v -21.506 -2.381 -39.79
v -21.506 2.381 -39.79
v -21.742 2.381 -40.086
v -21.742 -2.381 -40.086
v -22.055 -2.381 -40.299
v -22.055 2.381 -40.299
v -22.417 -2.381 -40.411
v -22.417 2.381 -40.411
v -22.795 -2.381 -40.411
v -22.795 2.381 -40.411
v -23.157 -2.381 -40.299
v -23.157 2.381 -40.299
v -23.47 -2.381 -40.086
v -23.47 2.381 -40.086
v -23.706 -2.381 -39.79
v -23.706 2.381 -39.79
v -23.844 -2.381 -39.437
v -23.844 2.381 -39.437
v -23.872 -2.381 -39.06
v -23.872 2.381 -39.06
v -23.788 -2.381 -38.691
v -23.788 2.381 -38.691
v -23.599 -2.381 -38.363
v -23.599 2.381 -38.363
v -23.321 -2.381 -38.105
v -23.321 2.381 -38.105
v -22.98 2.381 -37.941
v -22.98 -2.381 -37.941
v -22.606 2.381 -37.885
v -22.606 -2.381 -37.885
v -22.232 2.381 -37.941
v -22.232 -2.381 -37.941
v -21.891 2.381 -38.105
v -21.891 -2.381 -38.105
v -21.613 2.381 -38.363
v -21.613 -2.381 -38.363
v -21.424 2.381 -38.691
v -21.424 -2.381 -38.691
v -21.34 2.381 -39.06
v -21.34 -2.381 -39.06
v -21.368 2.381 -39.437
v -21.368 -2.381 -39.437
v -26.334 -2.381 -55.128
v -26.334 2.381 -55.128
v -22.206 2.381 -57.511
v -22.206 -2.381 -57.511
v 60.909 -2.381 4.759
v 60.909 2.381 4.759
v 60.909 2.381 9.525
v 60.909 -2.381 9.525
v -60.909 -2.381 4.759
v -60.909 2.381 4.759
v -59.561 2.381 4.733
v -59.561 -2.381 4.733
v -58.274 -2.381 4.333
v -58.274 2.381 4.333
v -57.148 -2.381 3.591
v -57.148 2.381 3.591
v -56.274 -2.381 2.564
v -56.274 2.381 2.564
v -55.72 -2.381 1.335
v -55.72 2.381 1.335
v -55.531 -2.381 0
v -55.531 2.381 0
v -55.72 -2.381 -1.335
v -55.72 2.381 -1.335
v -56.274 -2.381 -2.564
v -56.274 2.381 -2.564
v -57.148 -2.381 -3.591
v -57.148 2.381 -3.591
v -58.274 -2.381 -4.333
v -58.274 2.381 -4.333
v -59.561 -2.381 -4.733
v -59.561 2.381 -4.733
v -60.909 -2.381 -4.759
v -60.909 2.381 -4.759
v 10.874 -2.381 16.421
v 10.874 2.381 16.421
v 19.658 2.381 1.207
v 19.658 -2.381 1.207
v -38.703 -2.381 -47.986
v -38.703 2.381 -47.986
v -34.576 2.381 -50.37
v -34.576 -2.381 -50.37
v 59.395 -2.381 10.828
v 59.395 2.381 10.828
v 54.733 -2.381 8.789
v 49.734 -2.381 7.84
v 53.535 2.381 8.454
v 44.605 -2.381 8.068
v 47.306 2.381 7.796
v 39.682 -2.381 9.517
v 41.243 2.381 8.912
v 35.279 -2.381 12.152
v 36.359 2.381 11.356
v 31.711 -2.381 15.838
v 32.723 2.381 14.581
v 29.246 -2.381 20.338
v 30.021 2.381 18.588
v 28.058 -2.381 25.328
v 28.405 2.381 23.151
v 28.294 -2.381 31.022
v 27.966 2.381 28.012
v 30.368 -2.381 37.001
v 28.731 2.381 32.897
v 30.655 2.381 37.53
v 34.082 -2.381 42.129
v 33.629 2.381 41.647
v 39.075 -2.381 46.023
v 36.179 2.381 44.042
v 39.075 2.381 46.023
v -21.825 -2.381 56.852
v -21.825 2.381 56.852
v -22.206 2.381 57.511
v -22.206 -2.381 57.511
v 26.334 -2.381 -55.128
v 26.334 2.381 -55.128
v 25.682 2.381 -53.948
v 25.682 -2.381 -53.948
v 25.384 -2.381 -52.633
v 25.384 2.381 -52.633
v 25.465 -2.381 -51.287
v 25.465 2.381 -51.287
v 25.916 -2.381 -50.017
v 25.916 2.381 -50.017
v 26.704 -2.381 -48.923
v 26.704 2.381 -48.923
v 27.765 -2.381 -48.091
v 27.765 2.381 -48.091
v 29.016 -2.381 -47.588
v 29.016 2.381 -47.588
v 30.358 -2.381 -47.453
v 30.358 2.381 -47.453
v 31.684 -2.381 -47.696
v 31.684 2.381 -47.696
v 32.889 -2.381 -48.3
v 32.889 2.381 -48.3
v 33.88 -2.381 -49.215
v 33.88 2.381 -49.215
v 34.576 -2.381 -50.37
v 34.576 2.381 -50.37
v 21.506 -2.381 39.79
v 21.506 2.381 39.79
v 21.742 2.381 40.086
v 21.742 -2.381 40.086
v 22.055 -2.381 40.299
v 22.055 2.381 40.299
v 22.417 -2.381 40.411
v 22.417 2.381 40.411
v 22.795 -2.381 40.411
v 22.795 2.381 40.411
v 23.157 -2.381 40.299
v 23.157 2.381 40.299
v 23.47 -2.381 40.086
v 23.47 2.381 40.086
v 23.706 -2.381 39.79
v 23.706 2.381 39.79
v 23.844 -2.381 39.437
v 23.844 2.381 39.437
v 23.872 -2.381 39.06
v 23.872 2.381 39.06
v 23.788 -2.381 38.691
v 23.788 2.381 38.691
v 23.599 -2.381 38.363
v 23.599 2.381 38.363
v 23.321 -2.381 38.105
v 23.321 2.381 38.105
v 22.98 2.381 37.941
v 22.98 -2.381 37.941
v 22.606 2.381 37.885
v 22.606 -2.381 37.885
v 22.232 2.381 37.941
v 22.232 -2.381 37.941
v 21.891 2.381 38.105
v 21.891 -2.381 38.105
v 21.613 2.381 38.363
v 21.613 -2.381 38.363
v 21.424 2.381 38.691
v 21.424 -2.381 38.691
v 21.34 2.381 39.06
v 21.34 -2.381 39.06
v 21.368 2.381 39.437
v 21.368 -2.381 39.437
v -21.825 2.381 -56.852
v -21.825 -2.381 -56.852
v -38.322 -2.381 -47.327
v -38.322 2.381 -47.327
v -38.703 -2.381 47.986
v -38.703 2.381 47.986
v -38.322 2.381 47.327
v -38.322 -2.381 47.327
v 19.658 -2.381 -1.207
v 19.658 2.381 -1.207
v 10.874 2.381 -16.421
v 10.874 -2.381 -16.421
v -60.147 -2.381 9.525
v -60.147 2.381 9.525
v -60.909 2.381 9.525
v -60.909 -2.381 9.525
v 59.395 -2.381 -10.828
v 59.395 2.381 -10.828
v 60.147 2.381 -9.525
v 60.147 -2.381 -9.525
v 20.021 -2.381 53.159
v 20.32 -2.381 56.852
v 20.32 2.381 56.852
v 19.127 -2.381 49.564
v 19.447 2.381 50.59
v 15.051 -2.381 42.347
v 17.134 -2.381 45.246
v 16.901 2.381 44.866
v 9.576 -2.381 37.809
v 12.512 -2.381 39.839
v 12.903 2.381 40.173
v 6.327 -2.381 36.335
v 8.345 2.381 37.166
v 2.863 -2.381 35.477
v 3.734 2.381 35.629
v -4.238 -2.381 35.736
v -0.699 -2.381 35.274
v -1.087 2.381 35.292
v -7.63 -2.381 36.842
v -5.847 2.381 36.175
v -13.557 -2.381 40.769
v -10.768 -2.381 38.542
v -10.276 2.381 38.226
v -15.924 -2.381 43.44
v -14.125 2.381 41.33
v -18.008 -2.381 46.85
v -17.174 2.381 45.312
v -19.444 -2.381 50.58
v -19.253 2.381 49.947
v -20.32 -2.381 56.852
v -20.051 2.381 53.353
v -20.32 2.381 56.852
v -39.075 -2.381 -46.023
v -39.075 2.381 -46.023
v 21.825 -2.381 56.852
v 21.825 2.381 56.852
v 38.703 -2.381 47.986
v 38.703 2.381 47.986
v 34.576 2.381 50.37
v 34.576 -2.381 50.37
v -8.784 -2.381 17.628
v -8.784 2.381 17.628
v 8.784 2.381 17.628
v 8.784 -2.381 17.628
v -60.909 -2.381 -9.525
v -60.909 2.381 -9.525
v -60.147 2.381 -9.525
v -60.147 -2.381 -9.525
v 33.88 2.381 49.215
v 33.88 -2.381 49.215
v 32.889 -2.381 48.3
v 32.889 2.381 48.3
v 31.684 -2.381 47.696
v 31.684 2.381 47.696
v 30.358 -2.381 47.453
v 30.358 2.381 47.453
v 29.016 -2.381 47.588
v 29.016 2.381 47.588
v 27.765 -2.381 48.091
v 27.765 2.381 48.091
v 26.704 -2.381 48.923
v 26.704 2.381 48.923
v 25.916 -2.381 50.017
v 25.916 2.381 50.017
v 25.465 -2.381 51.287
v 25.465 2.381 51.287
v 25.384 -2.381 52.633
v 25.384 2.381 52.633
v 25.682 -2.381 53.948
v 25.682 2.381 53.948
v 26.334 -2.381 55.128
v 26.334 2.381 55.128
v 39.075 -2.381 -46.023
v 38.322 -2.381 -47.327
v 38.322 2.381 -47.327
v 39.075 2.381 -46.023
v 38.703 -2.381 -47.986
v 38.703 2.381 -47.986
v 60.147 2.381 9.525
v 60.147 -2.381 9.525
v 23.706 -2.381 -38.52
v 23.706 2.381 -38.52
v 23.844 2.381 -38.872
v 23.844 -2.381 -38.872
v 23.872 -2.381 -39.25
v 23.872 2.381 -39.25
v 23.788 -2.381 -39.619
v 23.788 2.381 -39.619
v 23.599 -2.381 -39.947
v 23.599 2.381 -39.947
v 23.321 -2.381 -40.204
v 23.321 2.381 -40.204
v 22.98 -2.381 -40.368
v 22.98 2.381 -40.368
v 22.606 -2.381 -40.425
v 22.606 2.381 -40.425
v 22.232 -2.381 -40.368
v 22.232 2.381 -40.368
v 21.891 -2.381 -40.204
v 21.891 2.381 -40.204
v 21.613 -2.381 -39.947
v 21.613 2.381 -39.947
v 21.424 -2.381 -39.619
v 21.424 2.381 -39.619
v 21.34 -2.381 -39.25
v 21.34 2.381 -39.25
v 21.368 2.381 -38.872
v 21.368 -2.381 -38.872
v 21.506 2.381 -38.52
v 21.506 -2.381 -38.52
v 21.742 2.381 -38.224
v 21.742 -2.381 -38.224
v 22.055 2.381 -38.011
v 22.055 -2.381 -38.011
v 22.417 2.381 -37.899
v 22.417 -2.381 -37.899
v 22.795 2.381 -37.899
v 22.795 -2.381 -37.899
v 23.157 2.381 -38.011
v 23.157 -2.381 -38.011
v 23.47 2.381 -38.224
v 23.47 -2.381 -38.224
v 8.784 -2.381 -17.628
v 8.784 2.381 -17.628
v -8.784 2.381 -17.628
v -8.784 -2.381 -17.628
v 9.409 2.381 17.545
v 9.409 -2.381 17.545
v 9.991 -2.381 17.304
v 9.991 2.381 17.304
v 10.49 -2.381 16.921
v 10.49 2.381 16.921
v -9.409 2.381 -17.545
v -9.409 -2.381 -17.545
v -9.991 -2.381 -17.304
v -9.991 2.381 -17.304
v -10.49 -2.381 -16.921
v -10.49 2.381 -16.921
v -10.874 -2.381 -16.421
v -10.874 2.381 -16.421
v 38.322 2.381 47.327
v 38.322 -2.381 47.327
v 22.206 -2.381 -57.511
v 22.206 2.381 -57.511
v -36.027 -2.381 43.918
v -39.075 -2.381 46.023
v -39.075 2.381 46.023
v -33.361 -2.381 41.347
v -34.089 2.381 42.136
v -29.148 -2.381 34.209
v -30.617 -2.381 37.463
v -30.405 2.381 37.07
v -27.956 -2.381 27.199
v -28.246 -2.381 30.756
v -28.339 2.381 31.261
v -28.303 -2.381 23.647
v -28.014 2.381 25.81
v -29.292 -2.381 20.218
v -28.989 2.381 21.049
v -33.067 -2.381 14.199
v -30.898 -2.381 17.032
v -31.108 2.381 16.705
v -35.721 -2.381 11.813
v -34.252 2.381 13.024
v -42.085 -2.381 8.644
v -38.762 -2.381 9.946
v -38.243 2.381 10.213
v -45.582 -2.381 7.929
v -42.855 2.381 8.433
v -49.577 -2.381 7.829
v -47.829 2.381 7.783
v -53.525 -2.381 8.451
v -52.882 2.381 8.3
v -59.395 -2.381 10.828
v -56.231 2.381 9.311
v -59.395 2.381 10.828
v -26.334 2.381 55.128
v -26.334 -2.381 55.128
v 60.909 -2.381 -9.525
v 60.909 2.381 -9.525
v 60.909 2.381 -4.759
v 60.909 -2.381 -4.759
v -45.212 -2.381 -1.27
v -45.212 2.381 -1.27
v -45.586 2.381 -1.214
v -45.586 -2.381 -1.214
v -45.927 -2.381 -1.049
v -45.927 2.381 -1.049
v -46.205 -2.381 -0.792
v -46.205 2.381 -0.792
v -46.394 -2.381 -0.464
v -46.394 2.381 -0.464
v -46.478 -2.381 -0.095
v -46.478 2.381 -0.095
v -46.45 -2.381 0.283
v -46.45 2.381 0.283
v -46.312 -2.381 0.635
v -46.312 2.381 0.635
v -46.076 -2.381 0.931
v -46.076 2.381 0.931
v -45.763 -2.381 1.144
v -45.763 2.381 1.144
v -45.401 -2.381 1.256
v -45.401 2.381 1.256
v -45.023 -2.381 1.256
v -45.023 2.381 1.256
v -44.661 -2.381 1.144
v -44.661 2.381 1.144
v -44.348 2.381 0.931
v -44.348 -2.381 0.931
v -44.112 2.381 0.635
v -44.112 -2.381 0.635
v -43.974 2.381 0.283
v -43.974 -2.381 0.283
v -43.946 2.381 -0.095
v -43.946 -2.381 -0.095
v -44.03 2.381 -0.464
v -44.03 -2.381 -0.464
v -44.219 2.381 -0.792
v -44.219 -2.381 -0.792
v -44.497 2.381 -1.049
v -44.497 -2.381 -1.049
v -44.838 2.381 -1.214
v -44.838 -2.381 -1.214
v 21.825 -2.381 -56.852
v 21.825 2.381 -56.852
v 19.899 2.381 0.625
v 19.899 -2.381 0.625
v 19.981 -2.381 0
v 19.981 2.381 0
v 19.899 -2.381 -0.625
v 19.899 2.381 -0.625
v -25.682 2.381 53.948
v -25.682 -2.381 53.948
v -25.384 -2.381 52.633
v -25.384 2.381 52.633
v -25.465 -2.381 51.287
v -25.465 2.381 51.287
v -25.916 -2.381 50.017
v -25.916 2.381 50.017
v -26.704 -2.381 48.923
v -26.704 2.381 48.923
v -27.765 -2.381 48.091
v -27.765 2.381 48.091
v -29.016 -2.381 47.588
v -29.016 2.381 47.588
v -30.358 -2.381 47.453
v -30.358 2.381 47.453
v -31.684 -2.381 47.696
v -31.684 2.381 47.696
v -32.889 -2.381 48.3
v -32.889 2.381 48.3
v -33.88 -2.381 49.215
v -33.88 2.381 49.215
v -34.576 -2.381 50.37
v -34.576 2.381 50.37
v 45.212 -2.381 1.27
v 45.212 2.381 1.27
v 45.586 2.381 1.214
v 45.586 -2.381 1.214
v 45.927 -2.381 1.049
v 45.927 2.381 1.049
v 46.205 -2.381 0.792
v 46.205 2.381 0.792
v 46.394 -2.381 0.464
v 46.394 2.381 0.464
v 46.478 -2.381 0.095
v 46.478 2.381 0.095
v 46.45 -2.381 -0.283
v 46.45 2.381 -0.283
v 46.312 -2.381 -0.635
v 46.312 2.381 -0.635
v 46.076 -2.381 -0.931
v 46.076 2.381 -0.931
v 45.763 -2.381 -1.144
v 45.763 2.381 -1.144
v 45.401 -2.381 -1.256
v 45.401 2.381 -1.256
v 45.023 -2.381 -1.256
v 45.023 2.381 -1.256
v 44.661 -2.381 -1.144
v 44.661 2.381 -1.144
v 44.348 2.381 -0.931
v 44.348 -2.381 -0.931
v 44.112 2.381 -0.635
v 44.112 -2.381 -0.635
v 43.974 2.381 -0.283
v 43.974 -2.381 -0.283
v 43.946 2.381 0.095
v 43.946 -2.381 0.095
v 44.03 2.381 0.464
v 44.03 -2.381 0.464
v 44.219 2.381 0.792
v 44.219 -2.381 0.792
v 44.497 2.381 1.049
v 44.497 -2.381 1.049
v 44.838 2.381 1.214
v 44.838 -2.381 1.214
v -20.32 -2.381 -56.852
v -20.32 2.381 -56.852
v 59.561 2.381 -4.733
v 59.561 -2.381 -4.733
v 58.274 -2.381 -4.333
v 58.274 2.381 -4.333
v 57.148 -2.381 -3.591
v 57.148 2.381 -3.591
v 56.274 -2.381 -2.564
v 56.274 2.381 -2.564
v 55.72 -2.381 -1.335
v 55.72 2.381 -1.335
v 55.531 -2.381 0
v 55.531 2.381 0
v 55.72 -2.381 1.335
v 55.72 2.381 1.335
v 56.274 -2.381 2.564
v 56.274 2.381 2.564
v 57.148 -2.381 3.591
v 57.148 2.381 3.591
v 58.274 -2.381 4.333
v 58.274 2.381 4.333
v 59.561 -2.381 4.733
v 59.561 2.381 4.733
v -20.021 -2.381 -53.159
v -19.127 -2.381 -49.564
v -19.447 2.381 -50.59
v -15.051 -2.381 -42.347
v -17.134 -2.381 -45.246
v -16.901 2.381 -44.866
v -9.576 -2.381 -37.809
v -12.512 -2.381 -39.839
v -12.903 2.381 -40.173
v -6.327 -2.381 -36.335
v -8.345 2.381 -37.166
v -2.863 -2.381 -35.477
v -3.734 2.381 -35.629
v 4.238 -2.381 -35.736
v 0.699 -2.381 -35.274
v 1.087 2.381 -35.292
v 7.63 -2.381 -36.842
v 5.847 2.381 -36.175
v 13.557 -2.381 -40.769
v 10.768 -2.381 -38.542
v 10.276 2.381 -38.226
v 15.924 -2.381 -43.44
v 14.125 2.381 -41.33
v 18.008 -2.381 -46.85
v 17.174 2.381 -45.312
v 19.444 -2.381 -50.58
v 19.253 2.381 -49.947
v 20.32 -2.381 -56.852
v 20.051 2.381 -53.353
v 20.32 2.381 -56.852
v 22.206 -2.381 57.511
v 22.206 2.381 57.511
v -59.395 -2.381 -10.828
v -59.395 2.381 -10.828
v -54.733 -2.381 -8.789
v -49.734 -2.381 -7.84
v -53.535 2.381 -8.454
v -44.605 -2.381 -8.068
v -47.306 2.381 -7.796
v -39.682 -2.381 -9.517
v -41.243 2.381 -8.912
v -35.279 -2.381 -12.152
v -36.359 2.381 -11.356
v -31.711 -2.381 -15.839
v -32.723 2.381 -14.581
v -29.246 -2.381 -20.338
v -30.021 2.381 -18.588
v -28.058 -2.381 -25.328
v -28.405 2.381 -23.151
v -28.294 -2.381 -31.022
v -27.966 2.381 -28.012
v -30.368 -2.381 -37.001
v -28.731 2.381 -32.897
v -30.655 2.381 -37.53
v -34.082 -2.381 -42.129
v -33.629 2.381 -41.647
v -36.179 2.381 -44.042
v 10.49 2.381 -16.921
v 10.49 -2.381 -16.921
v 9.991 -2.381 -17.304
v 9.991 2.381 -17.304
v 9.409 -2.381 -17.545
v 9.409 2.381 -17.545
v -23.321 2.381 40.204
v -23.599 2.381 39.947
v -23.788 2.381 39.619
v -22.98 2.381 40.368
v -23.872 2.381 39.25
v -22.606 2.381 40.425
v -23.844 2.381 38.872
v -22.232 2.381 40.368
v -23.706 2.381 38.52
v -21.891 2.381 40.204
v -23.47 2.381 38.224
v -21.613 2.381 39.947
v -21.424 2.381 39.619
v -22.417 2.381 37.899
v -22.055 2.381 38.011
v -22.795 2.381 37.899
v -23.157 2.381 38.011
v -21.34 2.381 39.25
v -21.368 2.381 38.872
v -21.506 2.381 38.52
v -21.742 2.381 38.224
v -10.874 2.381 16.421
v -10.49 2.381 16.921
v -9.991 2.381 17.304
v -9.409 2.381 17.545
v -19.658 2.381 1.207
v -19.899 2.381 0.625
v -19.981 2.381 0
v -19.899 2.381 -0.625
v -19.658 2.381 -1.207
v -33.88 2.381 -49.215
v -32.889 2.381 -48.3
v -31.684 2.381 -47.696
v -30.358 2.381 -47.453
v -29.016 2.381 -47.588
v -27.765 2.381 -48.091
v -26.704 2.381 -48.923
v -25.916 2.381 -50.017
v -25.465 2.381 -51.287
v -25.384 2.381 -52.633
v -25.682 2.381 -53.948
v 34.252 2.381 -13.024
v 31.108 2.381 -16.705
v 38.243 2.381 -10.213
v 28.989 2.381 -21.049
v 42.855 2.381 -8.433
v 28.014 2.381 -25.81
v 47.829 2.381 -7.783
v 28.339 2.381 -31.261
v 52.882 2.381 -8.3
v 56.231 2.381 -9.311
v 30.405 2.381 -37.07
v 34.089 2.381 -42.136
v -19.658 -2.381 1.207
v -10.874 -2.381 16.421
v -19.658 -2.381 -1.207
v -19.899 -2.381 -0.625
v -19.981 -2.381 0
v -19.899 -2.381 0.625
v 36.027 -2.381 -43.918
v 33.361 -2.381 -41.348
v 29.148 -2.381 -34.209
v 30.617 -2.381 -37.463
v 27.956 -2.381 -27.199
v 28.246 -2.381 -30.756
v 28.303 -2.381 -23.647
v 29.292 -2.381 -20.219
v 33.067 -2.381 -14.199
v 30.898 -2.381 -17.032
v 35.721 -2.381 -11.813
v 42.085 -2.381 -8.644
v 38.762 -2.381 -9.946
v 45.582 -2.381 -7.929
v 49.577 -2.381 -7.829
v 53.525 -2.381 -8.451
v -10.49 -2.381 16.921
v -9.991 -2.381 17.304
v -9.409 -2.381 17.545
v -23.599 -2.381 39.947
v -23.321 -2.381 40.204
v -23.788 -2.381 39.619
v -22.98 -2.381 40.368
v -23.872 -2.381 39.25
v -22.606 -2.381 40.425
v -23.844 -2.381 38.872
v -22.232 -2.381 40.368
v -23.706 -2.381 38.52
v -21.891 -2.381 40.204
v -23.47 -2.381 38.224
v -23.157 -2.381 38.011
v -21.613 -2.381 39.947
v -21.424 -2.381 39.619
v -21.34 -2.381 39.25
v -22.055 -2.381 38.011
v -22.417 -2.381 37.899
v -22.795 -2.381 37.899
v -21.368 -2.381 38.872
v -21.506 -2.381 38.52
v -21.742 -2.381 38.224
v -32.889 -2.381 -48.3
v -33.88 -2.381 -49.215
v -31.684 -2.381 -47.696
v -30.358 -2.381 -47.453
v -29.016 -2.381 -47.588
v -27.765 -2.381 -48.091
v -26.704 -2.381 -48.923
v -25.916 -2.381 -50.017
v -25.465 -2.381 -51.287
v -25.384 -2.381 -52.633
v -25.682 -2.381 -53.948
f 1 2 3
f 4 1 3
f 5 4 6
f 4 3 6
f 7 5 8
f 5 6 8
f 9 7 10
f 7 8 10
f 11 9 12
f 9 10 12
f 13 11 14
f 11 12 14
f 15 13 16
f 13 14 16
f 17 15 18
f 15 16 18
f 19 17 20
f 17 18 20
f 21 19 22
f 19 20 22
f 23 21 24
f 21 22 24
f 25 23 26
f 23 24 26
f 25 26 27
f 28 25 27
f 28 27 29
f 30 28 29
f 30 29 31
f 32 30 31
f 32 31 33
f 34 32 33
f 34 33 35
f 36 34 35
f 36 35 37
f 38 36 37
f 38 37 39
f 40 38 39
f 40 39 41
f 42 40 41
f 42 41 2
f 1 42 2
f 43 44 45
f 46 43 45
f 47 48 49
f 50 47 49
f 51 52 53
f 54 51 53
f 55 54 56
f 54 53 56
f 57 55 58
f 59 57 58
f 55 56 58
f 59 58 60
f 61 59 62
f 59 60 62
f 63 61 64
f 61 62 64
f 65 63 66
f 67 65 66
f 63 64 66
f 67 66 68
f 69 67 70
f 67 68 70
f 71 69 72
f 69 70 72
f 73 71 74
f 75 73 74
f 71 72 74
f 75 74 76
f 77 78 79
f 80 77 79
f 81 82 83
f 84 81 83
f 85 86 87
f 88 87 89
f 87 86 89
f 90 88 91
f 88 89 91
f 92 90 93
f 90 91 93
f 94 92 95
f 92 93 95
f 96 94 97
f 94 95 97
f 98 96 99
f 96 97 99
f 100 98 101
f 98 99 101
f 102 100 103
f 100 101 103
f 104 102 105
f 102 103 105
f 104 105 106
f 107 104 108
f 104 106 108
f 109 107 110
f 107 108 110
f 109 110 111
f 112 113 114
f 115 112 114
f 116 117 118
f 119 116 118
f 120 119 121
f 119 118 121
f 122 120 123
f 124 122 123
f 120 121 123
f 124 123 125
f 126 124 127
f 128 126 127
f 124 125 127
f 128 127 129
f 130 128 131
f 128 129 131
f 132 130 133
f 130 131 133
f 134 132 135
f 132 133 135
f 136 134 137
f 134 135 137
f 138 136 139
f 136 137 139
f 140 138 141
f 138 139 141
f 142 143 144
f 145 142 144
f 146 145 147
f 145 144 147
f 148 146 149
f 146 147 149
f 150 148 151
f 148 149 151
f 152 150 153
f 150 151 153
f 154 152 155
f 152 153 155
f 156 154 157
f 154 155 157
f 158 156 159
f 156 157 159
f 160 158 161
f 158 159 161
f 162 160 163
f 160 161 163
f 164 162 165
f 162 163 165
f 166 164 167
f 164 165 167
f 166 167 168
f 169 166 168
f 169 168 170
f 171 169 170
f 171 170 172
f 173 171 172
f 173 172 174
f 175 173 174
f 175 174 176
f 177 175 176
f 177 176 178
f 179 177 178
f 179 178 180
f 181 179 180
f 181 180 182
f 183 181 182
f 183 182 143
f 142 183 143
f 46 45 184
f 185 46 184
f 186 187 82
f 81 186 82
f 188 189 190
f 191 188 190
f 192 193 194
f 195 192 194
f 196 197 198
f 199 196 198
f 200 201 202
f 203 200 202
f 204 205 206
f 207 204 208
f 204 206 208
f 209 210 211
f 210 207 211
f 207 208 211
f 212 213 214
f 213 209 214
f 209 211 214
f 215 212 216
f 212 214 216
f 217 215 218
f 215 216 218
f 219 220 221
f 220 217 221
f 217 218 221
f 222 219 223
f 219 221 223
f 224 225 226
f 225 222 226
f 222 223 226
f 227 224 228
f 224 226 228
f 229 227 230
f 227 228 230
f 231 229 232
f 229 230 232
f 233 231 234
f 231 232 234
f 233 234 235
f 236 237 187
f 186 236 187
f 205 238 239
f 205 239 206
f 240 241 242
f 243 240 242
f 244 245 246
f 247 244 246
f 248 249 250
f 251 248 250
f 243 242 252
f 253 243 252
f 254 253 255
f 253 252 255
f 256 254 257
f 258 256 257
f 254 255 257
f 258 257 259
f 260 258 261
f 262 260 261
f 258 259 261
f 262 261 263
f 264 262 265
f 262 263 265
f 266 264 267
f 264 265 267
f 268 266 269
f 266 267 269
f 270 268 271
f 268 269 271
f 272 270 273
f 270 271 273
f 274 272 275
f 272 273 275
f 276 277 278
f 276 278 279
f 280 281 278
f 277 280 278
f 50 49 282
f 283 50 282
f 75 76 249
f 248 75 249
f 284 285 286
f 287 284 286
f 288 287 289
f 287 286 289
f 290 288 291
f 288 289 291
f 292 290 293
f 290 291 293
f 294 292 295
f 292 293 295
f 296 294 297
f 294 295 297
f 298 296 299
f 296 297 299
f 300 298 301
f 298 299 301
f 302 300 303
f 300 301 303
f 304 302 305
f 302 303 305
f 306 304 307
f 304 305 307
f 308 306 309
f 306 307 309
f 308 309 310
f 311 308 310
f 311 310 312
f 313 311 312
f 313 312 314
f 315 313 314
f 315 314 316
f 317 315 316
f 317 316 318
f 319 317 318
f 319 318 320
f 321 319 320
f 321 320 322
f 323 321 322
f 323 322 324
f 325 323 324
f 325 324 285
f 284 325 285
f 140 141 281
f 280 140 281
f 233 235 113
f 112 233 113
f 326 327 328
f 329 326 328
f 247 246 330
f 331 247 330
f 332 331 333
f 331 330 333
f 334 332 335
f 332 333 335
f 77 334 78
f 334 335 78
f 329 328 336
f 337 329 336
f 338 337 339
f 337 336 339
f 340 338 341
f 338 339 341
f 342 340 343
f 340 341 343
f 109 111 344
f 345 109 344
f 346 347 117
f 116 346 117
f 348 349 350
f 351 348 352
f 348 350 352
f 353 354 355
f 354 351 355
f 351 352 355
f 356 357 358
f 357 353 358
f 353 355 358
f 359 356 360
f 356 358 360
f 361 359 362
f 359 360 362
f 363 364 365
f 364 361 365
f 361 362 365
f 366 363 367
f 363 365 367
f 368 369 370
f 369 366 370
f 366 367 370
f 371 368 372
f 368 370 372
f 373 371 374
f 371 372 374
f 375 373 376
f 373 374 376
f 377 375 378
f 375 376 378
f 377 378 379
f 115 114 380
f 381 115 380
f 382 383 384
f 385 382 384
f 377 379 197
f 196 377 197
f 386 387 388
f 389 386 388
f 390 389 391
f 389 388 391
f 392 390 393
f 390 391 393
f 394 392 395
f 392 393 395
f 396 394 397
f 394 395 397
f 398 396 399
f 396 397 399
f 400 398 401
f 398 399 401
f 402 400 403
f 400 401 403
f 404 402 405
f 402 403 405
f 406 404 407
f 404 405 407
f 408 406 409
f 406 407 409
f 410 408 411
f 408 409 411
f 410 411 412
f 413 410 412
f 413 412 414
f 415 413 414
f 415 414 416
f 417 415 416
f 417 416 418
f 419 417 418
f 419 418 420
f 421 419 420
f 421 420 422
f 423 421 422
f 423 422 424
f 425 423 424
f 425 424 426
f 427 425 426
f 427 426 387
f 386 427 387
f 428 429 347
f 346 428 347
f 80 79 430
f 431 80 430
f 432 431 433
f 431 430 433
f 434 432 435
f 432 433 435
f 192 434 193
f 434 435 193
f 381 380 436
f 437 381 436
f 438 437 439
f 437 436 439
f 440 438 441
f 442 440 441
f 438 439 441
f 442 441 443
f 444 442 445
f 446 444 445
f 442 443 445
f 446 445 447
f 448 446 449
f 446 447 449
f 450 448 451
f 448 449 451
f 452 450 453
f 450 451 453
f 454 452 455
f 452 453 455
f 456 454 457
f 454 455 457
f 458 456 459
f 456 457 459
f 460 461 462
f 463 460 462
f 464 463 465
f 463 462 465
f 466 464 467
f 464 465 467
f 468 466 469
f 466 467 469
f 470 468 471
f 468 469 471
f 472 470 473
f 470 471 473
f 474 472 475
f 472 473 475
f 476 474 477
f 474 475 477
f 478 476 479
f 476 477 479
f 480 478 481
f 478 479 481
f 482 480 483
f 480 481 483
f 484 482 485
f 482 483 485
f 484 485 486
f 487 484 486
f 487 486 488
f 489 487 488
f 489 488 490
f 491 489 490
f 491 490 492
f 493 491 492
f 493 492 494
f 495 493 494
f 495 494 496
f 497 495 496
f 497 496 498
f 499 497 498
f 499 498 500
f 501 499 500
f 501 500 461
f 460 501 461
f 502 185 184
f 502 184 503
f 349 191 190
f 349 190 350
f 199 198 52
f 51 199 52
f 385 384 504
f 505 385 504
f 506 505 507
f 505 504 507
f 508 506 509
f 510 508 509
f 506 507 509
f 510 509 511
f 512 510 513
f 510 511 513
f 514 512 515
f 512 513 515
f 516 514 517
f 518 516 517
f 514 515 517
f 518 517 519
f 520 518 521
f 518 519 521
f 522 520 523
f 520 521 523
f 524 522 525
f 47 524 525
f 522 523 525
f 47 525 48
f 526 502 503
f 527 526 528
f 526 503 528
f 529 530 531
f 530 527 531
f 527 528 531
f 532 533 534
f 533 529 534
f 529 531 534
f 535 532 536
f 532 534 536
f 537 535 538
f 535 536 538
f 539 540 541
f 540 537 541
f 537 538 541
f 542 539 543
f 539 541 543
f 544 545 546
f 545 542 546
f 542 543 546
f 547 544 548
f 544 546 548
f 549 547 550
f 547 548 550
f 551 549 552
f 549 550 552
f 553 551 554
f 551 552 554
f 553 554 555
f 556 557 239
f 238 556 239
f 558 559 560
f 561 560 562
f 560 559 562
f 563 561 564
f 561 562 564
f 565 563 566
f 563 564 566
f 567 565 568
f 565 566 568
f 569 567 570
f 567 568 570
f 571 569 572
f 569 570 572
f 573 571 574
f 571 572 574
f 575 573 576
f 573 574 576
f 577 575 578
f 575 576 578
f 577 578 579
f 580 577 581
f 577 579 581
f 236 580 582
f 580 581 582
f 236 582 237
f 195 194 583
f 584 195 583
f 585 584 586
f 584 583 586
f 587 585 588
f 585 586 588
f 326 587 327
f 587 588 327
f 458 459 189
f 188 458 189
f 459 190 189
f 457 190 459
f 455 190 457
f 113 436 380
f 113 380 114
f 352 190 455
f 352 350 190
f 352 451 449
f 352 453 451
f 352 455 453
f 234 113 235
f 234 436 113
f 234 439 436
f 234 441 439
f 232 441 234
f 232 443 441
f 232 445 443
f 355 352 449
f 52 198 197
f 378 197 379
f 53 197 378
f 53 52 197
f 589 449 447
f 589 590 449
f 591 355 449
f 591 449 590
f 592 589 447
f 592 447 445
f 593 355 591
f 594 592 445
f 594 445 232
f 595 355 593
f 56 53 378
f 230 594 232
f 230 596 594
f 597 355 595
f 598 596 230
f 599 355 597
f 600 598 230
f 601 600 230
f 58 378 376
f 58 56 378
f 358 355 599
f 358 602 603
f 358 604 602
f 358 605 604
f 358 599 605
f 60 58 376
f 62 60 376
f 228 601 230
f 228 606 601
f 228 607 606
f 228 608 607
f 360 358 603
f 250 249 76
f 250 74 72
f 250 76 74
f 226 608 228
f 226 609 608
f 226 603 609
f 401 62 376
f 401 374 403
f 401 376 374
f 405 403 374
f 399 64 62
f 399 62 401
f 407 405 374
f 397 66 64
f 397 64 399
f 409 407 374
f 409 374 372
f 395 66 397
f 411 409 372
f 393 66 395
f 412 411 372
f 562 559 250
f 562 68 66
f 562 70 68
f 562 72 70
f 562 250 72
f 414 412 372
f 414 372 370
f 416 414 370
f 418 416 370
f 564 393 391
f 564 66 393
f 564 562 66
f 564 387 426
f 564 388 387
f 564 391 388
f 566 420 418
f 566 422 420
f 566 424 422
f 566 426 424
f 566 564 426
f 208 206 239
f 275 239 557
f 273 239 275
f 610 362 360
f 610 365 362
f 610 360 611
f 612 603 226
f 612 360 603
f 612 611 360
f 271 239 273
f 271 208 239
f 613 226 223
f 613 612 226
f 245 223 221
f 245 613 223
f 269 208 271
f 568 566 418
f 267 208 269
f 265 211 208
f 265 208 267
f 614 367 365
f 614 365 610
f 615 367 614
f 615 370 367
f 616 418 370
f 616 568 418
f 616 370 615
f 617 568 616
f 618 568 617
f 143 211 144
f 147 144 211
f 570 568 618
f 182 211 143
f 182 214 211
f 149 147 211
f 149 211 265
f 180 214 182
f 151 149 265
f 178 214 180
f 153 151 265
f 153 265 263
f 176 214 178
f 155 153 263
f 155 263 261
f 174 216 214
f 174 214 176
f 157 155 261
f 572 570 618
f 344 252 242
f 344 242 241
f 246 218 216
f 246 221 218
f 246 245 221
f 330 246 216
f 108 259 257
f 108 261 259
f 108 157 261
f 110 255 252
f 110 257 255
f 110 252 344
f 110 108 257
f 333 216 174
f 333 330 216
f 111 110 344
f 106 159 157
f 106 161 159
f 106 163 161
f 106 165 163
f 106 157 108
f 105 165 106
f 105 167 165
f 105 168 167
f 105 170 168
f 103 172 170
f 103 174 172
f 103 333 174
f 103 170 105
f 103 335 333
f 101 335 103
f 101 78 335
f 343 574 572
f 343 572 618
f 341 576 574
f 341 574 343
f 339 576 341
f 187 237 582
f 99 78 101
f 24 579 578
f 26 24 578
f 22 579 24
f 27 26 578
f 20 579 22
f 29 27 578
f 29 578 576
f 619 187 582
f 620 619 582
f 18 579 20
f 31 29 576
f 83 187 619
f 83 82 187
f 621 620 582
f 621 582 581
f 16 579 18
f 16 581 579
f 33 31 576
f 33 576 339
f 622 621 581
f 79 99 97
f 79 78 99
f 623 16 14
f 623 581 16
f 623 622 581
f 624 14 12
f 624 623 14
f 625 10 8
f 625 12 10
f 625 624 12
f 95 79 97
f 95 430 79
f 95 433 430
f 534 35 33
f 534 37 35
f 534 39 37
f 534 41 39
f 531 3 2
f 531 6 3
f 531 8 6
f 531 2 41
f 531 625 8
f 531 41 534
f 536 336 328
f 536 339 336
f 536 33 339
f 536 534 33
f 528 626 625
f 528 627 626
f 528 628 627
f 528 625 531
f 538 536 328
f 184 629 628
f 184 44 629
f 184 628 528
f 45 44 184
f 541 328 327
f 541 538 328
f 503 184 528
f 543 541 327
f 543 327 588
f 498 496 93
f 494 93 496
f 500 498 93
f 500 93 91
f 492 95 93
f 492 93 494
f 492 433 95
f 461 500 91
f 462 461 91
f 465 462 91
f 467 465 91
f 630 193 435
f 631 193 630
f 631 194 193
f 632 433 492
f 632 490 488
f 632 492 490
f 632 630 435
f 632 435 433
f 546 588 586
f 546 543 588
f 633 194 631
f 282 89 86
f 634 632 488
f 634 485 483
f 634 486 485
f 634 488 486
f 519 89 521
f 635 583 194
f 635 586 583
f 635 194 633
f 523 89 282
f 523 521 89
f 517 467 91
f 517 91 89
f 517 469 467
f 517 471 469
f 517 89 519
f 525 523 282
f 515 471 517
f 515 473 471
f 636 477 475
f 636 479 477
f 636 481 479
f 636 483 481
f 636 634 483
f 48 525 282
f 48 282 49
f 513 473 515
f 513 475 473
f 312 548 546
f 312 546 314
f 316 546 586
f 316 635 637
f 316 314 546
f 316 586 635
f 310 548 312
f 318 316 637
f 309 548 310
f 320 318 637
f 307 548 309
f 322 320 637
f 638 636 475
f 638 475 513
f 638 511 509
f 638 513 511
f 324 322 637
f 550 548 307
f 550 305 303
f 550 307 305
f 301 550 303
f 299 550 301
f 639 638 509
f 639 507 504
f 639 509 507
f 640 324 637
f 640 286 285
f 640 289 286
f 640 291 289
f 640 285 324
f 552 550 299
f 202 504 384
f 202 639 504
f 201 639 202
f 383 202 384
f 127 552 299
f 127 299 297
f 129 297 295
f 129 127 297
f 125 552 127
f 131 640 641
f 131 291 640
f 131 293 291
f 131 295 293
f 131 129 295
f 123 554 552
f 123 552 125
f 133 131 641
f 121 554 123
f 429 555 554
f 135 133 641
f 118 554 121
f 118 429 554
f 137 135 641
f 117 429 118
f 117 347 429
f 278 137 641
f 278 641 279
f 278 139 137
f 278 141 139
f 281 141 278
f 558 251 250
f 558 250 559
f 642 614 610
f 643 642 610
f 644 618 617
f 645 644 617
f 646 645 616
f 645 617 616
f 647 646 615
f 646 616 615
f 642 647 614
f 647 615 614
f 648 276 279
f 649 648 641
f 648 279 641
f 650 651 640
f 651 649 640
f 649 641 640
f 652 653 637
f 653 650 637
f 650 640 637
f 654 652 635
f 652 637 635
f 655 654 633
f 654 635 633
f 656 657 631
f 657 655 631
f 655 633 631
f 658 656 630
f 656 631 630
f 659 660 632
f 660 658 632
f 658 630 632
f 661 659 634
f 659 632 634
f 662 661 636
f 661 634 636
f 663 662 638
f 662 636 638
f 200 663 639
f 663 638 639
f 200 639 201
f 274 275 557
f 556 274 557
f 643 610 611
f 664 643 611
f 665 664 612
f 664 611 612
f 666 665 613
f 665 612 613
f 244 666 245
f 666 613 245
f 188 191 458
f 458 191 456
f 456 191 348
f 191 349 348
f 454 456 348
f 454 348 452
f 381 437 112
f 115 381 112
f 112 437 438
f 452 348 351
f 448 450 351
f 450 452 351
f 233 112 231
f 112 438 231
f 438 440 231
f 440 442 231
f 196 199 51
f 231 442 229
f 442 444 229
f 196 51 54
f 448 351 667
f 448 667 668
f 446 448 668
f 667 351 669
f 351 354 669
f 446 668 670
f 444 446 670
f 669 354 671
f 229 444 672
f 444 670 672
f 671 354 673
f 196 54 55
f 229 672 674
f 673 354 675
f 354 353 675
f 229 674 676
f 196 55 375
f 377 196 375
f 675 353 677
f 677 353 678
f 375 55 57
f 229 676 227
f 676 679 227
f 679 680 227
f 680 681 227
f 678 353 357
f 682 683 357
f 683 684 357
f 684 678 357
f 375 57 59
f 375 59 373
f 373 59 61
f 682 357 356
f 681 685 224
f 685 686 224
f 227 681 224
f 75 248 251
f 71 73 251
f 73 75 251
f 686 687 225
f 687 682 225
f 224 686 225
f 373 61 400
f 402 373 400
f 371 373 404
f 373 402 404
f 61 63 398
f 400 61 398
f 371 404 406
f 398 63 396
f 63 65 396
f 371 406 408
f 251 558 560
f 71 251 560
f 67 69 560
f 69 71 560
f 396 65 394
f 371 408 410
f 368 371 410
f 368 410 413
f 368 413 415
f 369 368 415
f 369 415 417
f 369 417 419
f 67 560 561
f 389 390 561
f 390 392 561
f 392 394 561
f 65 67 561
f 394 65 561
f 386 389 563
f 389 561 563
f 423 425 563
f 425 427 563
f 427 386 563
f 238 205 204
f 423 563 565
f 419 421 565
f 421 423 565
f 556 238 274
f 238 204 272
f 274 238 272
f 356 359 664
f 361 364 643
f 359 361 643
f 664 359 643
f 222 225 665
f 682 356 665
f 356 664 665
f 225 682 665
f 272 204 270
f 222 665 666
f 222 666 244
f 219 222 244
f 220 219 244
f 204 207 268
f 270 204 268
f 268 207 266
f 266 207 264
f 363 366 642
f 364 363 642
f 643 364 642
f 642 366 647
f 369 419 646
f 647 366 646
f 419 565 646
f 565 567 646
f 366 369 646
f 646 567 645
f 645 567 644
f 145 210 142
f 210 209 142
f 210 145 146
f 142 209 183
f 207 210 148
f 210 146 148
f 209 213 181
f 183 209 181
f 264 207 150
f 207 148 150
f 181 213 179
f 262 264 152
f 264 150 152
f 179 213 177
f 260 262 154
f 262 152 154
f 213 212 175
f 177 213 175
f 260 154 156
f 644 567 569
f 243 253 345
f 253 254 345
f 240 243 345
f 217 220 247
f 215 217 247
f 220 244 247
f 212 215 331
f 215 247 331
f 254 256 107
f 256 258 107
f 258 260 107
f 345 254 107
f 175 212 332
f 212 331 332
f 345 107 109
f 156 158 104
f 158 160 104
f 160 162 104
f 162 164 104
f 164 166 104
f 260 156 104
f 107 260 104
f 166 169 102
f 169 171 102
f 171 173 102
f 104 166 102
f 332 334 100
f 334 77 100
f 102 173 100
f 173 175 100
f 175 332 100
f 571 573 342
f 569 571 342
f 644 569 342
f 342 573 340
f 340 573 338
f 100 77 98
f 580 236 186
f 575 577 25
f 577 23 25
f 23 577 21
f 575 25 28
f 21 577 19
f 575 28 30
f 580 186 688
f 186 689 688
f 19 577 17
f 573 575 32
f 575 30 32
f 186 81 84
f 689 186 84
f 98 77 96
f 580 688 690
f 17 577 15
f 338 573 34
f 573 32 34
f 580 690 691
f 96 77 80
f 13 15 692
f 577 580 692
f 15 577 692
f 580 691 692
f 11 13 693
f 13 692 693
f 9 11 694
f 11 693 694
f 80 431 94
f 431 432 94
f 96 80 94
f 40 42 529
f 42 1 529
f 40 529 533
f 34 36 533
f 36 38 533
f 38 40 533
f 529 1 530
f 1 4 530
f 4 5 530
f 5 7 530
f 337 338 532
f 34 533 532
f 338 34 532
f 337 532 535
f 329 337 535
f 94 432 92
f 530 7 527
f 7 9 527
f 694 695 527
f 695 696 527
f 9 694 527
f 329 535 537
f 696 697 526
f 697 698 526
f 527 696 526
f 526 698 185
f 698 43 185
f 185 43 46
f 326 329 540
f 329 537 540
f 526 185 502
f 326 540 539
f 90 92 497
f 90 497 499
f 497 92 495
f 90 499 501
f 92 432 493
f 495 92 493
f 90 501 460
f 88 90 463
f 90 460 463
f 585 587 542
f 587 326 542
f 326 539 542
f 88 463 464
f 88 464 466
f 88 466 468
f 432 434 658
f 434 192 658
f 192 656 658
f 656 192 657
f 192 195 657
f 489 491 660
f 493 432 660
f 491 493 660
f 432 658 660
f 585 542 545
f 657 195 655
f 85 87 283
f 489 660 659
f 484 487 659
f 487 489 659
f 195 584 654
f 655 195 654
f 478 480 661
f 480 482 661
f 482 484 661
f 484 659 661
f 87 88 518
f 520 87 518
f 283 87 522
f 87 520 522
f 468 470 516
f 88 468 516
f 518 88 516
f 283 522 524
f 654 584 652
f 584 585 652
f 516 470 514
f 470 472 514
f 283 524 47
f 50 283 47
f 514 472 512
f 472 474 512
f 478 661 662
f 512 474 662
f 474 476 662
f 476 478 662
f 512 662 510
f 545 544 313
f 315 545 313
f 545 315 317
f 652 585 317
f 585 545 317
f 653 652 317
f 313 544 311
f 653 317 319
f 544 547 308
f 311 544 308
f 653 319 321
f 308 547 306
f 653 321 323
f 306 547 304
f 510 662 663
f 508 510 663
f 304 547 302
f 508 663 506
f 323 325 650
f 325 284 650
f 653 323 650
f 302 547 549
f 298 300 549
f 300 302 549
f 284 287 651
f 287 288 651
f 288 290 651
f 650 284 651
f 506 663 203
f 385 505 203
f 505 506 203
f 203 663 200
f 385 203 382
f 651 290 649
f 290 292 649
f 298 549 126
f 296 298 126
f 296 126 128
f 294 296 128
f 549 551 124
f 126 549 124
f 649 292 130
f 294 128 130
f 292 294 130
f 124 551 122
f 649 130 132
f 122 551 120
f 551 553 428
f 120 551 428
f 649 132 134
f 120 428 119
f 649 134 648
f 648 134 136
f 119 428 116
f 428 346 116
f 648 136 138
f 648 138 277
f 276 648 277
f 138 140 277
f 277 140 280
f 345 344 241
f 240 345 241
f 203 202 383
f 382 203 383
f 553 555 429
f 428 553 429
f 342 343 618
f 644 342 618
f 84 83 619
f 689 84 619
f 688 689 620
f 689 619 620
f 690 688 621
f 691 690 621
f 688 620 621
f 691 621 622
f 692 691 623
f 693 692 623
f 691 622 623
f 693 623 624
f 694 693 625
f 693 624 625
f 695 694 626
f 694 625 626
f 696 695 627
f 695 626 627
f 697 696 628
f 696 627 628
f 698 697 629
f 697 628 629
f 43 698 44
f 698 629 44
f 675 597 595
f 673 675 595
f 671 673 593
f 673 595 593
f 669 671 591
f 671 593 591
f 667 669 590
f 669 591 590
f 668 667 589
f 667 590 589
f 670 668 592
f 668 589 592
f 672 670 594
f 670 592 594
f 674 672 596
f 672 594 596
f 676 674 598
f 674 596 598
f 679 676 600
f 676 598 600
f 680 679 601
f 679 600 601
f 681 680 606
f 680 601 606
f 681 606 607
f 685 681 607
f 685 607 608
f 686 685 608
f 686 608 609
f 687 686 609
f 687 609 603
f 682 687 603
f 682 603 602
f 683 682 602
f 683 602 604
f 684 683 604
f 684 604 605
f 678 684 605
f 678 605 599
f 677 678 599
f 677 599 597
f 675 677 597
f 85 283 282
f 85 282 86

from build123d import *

# Parameters (mm, degrees)
SKETCH1_R           = 12.7
BOSS_EXTRUDE1_DEPTH = 2.38125
CUT_EXTRUDE1_DEPTH  = 83.900304501
FILLET1_R           = 3.175
SKETCH3_RX          = 21.59
SKETCH3_RY          = 20.32
CUT_EXTRUDE2_DEPTH  = 83.900304501
CIRPATTERN1_COUNT   = 6
SKETCH4_R           = 1.27
CUT_EXTRUDE3_DEPTH  = 83.900304648
CIRPATTERN2_COUNT   = 6
BOSS_EXTRUDE2_DEPTH = 4.7625


with BuildPart() as part:
    # Sketch1 → Boss-Extrude1 (new, symmetric)
    with BuildSketch(Plane(origin=(0, 0, 0), x_dir=(1, 0, 0), z_dir=(0, 1, 0))):
        with BuildLine():
            Line((-60.1472, 5.553404471), (-60.1472, 9.525))
            Line((-60.1472, 9.525), (-38.322491971, 47.326503167))
            Line((-38.322491971, 47.326503167), (-34.88298935, 49.312300931))
            ThreePointArc((-34.88298935, 49.312300931), (-27.384375, 47.431128834), (-25.26421065, 54.865705402))
            Line((-25.26421065, 54.865705402), (-21.824708029, 56.851503167))
            Line((-21.824708029, 56.851503167), (21.824708029, 56.851503167))
            Line((21.824708029, 56.851503167), (25.26421065, 54.865705402))
            ThreePointArc((25.26421065, 54.865705402), (27.384375, 47.431128834), (34.88298935, 49.312300931))
            Line((34.88298935, 49.312300931), (38.322491971, 47.326503167))
            Line((38.322491971, 47.326503167), (60.1472, 9.525))
            Line((60.1472, 9.525), (60.1472, 5.553404471))
            ThreePointArc((60.1472, 5.553404471), (54.76875, 0), (60.1472, -5.553404471))
            Line((60.1472, -5.553404471), (60.1472, -9.525))
            Line((60.1472, -9.525), (38.322491971, -47.326503167))
            Line((38.322491971, -47.326503167), (34.88298935, -49.312300931))
            ThreePointArc((34.88298935, -49.312300931), (27.384375, -47.431128834), (25.26421065, -54.865705402))
            Line((25.26421065, -54.865705402), (21.824708029, -56.851503167))
            Line((21.824708029, -56.851503167), (-21.824708029, -56.851503167))
            Line((-21.824708029, -56.851503167), (-25.26421065, -54.865705402))
            ThreePointArc((-25.26421065, -54.865705402), (-27.384375, -47.431128834), (-34.88298935, -49.312300931))
            Line((-34.88298935, -49.312300931), (-38.322491971, -47.326503167))
            Line((-38.322491971, -47.326503167), (-60.1472, -9.525))
            Line((-60.1472, -9.525), (-60.1472, -5.553404471))
            ThreePointArc((-60.1472, -5.553404471), (-54.76875, 0), (-60.1472, 5.553404471))
        make_face()
        with Locations(Location((0, 0, 0), (0, 0, 90))):
            Circle(SKETCH1_R, mode=Mode.SUBTRACT)
    extrude(amount=BOSS_EXTRUDE1_DEPTH, both=True)

    # Sketch2 → Cut-Extrude1 (cut, through all)
    with BuildSketch(Plane(origin=(0, 2.38125, 0), x_dir=(1, 0, 0), z_dir=(0, 1, 0))):
        Polygon((10.61724051, -18.3896), (21.234481021, 0), (10.61724051, 18.3896), (-10.61724051, 18.3896), (-21.234481021, 0), (-10.61724051, -18.3896), align=None)
    extrude(amount=-CUT_EXTRUDE1_DEPTH, mode=Mode.SUBTRACT)

    # Fillet1
    fillet1_edges = [part.edges().sort_by_distance(p)[0] for p in [
        (10.61724051, 0, 18.3896),
        (-10.61724051, 0, 18.3896),
        (-21.234481021, 0, 0),
        (-10.61724051, 0, -18.3896),
        (10.61724051, 0, -18.3896),
        (21.234481021, 0, 0),
    ]]
    fillet(fillet1_edges, radius=FILLET1_R)

    # Sketch3 → Cut-Extrude2 (cut, through all)
    with BuildSketch(Plane(origin=(0, 2.38125, 0), x_dir=(1, 0, 0), z_dir=(0, 1, 0))):
        with Locations(Location((0, -56.851503167), (0, 0, -90))):
            Ellipse(SKETCH3_RX, SKETCH3_RY)
    cut_extrude2 = extrude(amount=-CUT_EXTRUDE2_DEPTH, mode=Mode.SUBTRACT)

    # CirPattern1: Cut-Extrude2 ×6 about axis
    cirpattern1_axis = Axis((0, -55, 0), (0, 1, 0))
    for i in range(1, CIRPATTERN1_COUNT):
        add(cut_extrude2.rotate(cirpattern1_axis, i * 360 / CIRPATTERN1_COUNT), mode=Mode.SUBTRACT)

    # Sketch4 → Cut-Extrude3 (cut, through all)
    with BuildSketch(Plane(origin=(0, 2.38125, 0), x_dir=(1, 0, 0), z_dir=(0, 1, 0))):
        with Locations(Location((45.212, 0, 0), (0, 0, 270))):
            Circle(SKETCH4_R)
    cut_extrude3 = extrude(amount=-CUT_EXTRUDE3_DEPTH, mode=Mode.SUBTRACT)

    # CirPattern2: Cut-Extrude3 ×6 about axis
    cirpattern2_axis = Axis((0, 0, 0), (0, 1, 0))
    for i in range(1, CIRPATTERN2_COUNT):
        add(cut_extrude3.rotate(cirpattern2_axis, i * 360 / CIRPATTERN2_COUNT), mode=Mode.SUBTRACT)

    # Sketch6 → Boss-Extrude2 (add)
    # profile 1 of 7: a face of its own
    with BuildSketch(Plane(origin=(0, 2.38125, 0), x_dir=(1, 0, 0), z_dir=(0, 1, 0))):
        with BuildLine():
            Line((11.533784063, -16.8021), (20.317937468, -1.5875))
            ThreePointArc((20.317937468, -1.5875), (20.743306811, 0), (20.317937468, 1.5875))
            Line((20.317937468, 1.5875), (11.533784063, 16.8021))
            ThreePointArc((11.533784063, 16.8021), (10.371653406, 17.964230657), (8.784153406, 18.3896))
            Line((8.784153406, 18.3896), (-8.784153406, 18.3896))
            ThreePointArc((-8.784153406, 18.3896), (-10.371653406, 17.964230657), (-11.533784063, 16.8021))
            Line((-11.533784063, 16.8021), (-20.317937468, 1.5875))
            ThreePointArc((-20.317937468, 1.5875), (-20.743306811, 0), (-20.317937468, -1.5875))
            Line((-20.317937468, -1.5875), (-11.533784063, -16.8021))
            ThreePointArc((-11.533784063, -16.8021), (-10.371653406, -17.964230657), (-8.784153406, -18.3896))
            Line((-8.784153406, -18.3896), (8.784153406, -18.3896))
            ThreePointArc((8.784153406, -18.3896), (10.371653406, -17.964230657), (11.533784063, -16.8021))
        make_face()
        with BuildLine():
            Line((19.658026111, 1.2065), (10.873872705, 16.4211))
            ThreePointArc((10.873872705, 16.4211), (9.990653406, 17.304319299), (8.784153406, 17.6276))
            Line((8.784153406, 17.6276), (-8.784153406, 17.6276))
            ThreePointArc((-8.784153406, 17.6276), (-9.990653406, 17.304319299), (-10.873872705, 16.4211))
            Line((-10.873872705, 16.4211), (-19.658026111, 1.2065))
            ThreePointArc((-19.658026111, 1.2065), (-19.981306811, 0), (-19.658026111, -1.2065))
            Line((-19.658026111, -1.2065), (-10.873872705, -16.4211))
            ThreePointArc((-10.873872705, -16.4211), (-9.990653406, -17.304319299), (-8.784153406, -17.6276))
            Line((-8.784153406, -17.6276), (8.784153406, -17.6276))
            ThreePointArc((8.784153406, -17.6276), (9.990653406, -17.304319299), (10.873872705, -16.4211))
            Line((10.873872705, -16.4211), (19.658026111, -1.2065))
            ThreePointArc((19.658026111, -1.2065), (19.981306811, 0), (19.658026111, 1.2065))
        make_face(mode=Mode.SUBTRACT)
    # profile 2 of 7: a face of its own
    with BuildSketch(Plane(origin=(0, 2.38125, 0), x_dir=(1, 0, 0), z_dir=(0, 1, 0))):
        with BuildLine():
            Line((-60.1472, -5.553404471), (-60.1472, -9.525))
            Line((-60.1472, -9.525), (-60.9092, -9.525))
            Line((-60.9092, -9.525), (-60.9092, -4.75852324))
            ThreePointArc((-60.9092, -4.75852324), (-55.53075, 0), (-60.9092, 4.75852324))
            Line((-60.9092, 4.75852324), (-60.9092, 9.525))
            Line((-60.9092, 9.525), (-60.1472, 9.525))
            Line((-60.1472, 9.525), (-60.1472, 5.553404471))
            ThreePointArc((-60.1472, 5.553404471), (-54.76875, 0), (-60.1472, -5.553404471))
        make_face()
    # profile 3 of 7: a face of its own
    with BuildSketch(Plane(origin=(0, 2.38125, 0), x_dir=(1, 0, 0), z_dir=(0, 1, 0))):
        with BuildLine():
            Line((-34.88298935, 49.312300931), (-38.322491971, 47.326503167))
            Line((-38.322491971, 47.326503167), (-38.703491971, 47.986414524))
            Line((-38.703491971, 47.986414524), (-34.57560201, 50.369652904))
            ThreePointArc((-34.57560201, 50.369652904), (-27.765375, 48.091040191), (-26.33359799, 55.128176144))
            Line((-26.33359799, 55.128176144), (-22.205708029, 57.511414524))
            Line((-22.205708029, 57.511414524), (-21.824708029, 56.851503167))
            Line((-21.824708029, 56.851503167), (-25.26421065, 54.865705402))
            ThreePointArc((-25.26421065, 54.865705402), (-27.384375, 47.431128834), (-34.88298935, 49.312300931))
        make_face()
    # profile 4 of 7: a face of its own
    with BuildSketch(Plane(origin=(0, 2.38125, 0), x_dir=(1, 0, 0), z_dir=(0, 1, 0))):
        with BuildLine():
            Line((25.26421065, 54.865705402), (21.824708029, 56.851503167))
            Line((21.824708029, 56.851503167), (22.205708029, 57.511414524))
            Line((22.205708029, 57.511414524), (26.33359799, 55.128176144))
            ThreePointArc((26.33359799, 55.128176144), (27.765375, 48.091040191), (34.57560201, 50.369652904))
            Line((34.57560201, 50.369652904), (38.703491971, 47.986414524))
            Line((38.703491971, 47.986414524), (38.322491971, 47.326503167))
            Line((38.322491971, 47.326503167), (34.88298935, 49.312300931))
            ThreePointArc((34.88298935, 49.312300931), (27.384375, 47.431128834), (25.26421065, 54.865705402))
        make_face()
    # profile 5 of 7: a face of its own
    with BuildSketch(Plane(origin=(0, 2.38125, 0), x_dir=(1, 0, 0), z_dir=(0, 1, 0))):
        with BuildLine():
            Line((60.1472, 5.553404471), (60.1472, 9.525))
            Line((60.1472, 9.525), (60.9092, 9.525))
            Line((60.9092, 9.525), (60.9092, 4.75852324))
            ThreePointArc((60.9092, 4.75852324), (55.53075, 0), (60.9092, -4.75852324))
            Line((60.9092, -4.75852324), (60.9092, -9.525))
            Line((60.9092, -9.525), (60.1472, -9.525))
            Line((60.1472, -9.525), (60.1472, -5.553404471))
            ThreePointArc((60.1472, -5.553404471), (54.76875, 0), (60.1472, 5.553404471))
        make_face()
    # profile 6 of 7: a face of its own
    with BuildSketch(Plane(origin=(0, 2.38125, 0), x_dir=(1, 0, 0), z_dir=(0, 1, 0))):
        with BuildLine():
            Line((34.88298935, -49.312300931), (38.322491971, -47.326503167))
            Line((38.322491971, -47.326503167), (38.703491971, -47.986414524))
            Line((38.703491971, -47.986414524), (34.57560201, -50.369652904))
            ThreePointArc((34.57560201, -50.369652904), (27.765375, -48.091040191), (26.33359799, -55.128176144))
            Line((26.33359799, -55.128176144), (22.205708029, -57.511414524))
            Line((22.205708029, -57.511414524), (21.824708029, -56.851503167))
            Line((21.824708029, -56.851503167), (25.26421065, -54.865705402))
            ThreePointArc((25.26421065, -54.865705402), (27.384375, -47.431128834), (34.88298935, -49.312300931))
        make_face()
    # profile 7 of 7: a face of its own
    with BuildSketch(Plane(origin=(0, 2.38125, 0), x_dir=(1, 0, 0), z_dir=(0, 1, 0))):
        with BuildLine():
            Line((-25.26421065, -54.865705402), (-21.824708029, -56.851503167))
            Line((-21.824708029, -56.851503167), (-22.205708029, -57.511414524))
            Line((-22.205708029, -57.511414524), (-26.33359799, -55.128176144))
            ThreePointArc((-26.33359799, -55.128176144), (-27.765375, -48.091040191), (-34.57560201, -50.369652904))
            Line((-34.57560201, -50.369652904), (-38.703491971, -47.986414524))
            Line((-38.703491971, -47.986414524), (-38.322491971, -47.326503167))
            Line((-38.322491971, -47.326503167), (-34.88298935, -49.312300931))
            ThreePointArc((-34.88298935, -49.312300931), (-27.384375, -47.431128834), (-25.26421065, -54.865705402))
        make_face()
    extrude(amount=-BOSS_EXTRUDE2_DEPTH)


solid = part.part
